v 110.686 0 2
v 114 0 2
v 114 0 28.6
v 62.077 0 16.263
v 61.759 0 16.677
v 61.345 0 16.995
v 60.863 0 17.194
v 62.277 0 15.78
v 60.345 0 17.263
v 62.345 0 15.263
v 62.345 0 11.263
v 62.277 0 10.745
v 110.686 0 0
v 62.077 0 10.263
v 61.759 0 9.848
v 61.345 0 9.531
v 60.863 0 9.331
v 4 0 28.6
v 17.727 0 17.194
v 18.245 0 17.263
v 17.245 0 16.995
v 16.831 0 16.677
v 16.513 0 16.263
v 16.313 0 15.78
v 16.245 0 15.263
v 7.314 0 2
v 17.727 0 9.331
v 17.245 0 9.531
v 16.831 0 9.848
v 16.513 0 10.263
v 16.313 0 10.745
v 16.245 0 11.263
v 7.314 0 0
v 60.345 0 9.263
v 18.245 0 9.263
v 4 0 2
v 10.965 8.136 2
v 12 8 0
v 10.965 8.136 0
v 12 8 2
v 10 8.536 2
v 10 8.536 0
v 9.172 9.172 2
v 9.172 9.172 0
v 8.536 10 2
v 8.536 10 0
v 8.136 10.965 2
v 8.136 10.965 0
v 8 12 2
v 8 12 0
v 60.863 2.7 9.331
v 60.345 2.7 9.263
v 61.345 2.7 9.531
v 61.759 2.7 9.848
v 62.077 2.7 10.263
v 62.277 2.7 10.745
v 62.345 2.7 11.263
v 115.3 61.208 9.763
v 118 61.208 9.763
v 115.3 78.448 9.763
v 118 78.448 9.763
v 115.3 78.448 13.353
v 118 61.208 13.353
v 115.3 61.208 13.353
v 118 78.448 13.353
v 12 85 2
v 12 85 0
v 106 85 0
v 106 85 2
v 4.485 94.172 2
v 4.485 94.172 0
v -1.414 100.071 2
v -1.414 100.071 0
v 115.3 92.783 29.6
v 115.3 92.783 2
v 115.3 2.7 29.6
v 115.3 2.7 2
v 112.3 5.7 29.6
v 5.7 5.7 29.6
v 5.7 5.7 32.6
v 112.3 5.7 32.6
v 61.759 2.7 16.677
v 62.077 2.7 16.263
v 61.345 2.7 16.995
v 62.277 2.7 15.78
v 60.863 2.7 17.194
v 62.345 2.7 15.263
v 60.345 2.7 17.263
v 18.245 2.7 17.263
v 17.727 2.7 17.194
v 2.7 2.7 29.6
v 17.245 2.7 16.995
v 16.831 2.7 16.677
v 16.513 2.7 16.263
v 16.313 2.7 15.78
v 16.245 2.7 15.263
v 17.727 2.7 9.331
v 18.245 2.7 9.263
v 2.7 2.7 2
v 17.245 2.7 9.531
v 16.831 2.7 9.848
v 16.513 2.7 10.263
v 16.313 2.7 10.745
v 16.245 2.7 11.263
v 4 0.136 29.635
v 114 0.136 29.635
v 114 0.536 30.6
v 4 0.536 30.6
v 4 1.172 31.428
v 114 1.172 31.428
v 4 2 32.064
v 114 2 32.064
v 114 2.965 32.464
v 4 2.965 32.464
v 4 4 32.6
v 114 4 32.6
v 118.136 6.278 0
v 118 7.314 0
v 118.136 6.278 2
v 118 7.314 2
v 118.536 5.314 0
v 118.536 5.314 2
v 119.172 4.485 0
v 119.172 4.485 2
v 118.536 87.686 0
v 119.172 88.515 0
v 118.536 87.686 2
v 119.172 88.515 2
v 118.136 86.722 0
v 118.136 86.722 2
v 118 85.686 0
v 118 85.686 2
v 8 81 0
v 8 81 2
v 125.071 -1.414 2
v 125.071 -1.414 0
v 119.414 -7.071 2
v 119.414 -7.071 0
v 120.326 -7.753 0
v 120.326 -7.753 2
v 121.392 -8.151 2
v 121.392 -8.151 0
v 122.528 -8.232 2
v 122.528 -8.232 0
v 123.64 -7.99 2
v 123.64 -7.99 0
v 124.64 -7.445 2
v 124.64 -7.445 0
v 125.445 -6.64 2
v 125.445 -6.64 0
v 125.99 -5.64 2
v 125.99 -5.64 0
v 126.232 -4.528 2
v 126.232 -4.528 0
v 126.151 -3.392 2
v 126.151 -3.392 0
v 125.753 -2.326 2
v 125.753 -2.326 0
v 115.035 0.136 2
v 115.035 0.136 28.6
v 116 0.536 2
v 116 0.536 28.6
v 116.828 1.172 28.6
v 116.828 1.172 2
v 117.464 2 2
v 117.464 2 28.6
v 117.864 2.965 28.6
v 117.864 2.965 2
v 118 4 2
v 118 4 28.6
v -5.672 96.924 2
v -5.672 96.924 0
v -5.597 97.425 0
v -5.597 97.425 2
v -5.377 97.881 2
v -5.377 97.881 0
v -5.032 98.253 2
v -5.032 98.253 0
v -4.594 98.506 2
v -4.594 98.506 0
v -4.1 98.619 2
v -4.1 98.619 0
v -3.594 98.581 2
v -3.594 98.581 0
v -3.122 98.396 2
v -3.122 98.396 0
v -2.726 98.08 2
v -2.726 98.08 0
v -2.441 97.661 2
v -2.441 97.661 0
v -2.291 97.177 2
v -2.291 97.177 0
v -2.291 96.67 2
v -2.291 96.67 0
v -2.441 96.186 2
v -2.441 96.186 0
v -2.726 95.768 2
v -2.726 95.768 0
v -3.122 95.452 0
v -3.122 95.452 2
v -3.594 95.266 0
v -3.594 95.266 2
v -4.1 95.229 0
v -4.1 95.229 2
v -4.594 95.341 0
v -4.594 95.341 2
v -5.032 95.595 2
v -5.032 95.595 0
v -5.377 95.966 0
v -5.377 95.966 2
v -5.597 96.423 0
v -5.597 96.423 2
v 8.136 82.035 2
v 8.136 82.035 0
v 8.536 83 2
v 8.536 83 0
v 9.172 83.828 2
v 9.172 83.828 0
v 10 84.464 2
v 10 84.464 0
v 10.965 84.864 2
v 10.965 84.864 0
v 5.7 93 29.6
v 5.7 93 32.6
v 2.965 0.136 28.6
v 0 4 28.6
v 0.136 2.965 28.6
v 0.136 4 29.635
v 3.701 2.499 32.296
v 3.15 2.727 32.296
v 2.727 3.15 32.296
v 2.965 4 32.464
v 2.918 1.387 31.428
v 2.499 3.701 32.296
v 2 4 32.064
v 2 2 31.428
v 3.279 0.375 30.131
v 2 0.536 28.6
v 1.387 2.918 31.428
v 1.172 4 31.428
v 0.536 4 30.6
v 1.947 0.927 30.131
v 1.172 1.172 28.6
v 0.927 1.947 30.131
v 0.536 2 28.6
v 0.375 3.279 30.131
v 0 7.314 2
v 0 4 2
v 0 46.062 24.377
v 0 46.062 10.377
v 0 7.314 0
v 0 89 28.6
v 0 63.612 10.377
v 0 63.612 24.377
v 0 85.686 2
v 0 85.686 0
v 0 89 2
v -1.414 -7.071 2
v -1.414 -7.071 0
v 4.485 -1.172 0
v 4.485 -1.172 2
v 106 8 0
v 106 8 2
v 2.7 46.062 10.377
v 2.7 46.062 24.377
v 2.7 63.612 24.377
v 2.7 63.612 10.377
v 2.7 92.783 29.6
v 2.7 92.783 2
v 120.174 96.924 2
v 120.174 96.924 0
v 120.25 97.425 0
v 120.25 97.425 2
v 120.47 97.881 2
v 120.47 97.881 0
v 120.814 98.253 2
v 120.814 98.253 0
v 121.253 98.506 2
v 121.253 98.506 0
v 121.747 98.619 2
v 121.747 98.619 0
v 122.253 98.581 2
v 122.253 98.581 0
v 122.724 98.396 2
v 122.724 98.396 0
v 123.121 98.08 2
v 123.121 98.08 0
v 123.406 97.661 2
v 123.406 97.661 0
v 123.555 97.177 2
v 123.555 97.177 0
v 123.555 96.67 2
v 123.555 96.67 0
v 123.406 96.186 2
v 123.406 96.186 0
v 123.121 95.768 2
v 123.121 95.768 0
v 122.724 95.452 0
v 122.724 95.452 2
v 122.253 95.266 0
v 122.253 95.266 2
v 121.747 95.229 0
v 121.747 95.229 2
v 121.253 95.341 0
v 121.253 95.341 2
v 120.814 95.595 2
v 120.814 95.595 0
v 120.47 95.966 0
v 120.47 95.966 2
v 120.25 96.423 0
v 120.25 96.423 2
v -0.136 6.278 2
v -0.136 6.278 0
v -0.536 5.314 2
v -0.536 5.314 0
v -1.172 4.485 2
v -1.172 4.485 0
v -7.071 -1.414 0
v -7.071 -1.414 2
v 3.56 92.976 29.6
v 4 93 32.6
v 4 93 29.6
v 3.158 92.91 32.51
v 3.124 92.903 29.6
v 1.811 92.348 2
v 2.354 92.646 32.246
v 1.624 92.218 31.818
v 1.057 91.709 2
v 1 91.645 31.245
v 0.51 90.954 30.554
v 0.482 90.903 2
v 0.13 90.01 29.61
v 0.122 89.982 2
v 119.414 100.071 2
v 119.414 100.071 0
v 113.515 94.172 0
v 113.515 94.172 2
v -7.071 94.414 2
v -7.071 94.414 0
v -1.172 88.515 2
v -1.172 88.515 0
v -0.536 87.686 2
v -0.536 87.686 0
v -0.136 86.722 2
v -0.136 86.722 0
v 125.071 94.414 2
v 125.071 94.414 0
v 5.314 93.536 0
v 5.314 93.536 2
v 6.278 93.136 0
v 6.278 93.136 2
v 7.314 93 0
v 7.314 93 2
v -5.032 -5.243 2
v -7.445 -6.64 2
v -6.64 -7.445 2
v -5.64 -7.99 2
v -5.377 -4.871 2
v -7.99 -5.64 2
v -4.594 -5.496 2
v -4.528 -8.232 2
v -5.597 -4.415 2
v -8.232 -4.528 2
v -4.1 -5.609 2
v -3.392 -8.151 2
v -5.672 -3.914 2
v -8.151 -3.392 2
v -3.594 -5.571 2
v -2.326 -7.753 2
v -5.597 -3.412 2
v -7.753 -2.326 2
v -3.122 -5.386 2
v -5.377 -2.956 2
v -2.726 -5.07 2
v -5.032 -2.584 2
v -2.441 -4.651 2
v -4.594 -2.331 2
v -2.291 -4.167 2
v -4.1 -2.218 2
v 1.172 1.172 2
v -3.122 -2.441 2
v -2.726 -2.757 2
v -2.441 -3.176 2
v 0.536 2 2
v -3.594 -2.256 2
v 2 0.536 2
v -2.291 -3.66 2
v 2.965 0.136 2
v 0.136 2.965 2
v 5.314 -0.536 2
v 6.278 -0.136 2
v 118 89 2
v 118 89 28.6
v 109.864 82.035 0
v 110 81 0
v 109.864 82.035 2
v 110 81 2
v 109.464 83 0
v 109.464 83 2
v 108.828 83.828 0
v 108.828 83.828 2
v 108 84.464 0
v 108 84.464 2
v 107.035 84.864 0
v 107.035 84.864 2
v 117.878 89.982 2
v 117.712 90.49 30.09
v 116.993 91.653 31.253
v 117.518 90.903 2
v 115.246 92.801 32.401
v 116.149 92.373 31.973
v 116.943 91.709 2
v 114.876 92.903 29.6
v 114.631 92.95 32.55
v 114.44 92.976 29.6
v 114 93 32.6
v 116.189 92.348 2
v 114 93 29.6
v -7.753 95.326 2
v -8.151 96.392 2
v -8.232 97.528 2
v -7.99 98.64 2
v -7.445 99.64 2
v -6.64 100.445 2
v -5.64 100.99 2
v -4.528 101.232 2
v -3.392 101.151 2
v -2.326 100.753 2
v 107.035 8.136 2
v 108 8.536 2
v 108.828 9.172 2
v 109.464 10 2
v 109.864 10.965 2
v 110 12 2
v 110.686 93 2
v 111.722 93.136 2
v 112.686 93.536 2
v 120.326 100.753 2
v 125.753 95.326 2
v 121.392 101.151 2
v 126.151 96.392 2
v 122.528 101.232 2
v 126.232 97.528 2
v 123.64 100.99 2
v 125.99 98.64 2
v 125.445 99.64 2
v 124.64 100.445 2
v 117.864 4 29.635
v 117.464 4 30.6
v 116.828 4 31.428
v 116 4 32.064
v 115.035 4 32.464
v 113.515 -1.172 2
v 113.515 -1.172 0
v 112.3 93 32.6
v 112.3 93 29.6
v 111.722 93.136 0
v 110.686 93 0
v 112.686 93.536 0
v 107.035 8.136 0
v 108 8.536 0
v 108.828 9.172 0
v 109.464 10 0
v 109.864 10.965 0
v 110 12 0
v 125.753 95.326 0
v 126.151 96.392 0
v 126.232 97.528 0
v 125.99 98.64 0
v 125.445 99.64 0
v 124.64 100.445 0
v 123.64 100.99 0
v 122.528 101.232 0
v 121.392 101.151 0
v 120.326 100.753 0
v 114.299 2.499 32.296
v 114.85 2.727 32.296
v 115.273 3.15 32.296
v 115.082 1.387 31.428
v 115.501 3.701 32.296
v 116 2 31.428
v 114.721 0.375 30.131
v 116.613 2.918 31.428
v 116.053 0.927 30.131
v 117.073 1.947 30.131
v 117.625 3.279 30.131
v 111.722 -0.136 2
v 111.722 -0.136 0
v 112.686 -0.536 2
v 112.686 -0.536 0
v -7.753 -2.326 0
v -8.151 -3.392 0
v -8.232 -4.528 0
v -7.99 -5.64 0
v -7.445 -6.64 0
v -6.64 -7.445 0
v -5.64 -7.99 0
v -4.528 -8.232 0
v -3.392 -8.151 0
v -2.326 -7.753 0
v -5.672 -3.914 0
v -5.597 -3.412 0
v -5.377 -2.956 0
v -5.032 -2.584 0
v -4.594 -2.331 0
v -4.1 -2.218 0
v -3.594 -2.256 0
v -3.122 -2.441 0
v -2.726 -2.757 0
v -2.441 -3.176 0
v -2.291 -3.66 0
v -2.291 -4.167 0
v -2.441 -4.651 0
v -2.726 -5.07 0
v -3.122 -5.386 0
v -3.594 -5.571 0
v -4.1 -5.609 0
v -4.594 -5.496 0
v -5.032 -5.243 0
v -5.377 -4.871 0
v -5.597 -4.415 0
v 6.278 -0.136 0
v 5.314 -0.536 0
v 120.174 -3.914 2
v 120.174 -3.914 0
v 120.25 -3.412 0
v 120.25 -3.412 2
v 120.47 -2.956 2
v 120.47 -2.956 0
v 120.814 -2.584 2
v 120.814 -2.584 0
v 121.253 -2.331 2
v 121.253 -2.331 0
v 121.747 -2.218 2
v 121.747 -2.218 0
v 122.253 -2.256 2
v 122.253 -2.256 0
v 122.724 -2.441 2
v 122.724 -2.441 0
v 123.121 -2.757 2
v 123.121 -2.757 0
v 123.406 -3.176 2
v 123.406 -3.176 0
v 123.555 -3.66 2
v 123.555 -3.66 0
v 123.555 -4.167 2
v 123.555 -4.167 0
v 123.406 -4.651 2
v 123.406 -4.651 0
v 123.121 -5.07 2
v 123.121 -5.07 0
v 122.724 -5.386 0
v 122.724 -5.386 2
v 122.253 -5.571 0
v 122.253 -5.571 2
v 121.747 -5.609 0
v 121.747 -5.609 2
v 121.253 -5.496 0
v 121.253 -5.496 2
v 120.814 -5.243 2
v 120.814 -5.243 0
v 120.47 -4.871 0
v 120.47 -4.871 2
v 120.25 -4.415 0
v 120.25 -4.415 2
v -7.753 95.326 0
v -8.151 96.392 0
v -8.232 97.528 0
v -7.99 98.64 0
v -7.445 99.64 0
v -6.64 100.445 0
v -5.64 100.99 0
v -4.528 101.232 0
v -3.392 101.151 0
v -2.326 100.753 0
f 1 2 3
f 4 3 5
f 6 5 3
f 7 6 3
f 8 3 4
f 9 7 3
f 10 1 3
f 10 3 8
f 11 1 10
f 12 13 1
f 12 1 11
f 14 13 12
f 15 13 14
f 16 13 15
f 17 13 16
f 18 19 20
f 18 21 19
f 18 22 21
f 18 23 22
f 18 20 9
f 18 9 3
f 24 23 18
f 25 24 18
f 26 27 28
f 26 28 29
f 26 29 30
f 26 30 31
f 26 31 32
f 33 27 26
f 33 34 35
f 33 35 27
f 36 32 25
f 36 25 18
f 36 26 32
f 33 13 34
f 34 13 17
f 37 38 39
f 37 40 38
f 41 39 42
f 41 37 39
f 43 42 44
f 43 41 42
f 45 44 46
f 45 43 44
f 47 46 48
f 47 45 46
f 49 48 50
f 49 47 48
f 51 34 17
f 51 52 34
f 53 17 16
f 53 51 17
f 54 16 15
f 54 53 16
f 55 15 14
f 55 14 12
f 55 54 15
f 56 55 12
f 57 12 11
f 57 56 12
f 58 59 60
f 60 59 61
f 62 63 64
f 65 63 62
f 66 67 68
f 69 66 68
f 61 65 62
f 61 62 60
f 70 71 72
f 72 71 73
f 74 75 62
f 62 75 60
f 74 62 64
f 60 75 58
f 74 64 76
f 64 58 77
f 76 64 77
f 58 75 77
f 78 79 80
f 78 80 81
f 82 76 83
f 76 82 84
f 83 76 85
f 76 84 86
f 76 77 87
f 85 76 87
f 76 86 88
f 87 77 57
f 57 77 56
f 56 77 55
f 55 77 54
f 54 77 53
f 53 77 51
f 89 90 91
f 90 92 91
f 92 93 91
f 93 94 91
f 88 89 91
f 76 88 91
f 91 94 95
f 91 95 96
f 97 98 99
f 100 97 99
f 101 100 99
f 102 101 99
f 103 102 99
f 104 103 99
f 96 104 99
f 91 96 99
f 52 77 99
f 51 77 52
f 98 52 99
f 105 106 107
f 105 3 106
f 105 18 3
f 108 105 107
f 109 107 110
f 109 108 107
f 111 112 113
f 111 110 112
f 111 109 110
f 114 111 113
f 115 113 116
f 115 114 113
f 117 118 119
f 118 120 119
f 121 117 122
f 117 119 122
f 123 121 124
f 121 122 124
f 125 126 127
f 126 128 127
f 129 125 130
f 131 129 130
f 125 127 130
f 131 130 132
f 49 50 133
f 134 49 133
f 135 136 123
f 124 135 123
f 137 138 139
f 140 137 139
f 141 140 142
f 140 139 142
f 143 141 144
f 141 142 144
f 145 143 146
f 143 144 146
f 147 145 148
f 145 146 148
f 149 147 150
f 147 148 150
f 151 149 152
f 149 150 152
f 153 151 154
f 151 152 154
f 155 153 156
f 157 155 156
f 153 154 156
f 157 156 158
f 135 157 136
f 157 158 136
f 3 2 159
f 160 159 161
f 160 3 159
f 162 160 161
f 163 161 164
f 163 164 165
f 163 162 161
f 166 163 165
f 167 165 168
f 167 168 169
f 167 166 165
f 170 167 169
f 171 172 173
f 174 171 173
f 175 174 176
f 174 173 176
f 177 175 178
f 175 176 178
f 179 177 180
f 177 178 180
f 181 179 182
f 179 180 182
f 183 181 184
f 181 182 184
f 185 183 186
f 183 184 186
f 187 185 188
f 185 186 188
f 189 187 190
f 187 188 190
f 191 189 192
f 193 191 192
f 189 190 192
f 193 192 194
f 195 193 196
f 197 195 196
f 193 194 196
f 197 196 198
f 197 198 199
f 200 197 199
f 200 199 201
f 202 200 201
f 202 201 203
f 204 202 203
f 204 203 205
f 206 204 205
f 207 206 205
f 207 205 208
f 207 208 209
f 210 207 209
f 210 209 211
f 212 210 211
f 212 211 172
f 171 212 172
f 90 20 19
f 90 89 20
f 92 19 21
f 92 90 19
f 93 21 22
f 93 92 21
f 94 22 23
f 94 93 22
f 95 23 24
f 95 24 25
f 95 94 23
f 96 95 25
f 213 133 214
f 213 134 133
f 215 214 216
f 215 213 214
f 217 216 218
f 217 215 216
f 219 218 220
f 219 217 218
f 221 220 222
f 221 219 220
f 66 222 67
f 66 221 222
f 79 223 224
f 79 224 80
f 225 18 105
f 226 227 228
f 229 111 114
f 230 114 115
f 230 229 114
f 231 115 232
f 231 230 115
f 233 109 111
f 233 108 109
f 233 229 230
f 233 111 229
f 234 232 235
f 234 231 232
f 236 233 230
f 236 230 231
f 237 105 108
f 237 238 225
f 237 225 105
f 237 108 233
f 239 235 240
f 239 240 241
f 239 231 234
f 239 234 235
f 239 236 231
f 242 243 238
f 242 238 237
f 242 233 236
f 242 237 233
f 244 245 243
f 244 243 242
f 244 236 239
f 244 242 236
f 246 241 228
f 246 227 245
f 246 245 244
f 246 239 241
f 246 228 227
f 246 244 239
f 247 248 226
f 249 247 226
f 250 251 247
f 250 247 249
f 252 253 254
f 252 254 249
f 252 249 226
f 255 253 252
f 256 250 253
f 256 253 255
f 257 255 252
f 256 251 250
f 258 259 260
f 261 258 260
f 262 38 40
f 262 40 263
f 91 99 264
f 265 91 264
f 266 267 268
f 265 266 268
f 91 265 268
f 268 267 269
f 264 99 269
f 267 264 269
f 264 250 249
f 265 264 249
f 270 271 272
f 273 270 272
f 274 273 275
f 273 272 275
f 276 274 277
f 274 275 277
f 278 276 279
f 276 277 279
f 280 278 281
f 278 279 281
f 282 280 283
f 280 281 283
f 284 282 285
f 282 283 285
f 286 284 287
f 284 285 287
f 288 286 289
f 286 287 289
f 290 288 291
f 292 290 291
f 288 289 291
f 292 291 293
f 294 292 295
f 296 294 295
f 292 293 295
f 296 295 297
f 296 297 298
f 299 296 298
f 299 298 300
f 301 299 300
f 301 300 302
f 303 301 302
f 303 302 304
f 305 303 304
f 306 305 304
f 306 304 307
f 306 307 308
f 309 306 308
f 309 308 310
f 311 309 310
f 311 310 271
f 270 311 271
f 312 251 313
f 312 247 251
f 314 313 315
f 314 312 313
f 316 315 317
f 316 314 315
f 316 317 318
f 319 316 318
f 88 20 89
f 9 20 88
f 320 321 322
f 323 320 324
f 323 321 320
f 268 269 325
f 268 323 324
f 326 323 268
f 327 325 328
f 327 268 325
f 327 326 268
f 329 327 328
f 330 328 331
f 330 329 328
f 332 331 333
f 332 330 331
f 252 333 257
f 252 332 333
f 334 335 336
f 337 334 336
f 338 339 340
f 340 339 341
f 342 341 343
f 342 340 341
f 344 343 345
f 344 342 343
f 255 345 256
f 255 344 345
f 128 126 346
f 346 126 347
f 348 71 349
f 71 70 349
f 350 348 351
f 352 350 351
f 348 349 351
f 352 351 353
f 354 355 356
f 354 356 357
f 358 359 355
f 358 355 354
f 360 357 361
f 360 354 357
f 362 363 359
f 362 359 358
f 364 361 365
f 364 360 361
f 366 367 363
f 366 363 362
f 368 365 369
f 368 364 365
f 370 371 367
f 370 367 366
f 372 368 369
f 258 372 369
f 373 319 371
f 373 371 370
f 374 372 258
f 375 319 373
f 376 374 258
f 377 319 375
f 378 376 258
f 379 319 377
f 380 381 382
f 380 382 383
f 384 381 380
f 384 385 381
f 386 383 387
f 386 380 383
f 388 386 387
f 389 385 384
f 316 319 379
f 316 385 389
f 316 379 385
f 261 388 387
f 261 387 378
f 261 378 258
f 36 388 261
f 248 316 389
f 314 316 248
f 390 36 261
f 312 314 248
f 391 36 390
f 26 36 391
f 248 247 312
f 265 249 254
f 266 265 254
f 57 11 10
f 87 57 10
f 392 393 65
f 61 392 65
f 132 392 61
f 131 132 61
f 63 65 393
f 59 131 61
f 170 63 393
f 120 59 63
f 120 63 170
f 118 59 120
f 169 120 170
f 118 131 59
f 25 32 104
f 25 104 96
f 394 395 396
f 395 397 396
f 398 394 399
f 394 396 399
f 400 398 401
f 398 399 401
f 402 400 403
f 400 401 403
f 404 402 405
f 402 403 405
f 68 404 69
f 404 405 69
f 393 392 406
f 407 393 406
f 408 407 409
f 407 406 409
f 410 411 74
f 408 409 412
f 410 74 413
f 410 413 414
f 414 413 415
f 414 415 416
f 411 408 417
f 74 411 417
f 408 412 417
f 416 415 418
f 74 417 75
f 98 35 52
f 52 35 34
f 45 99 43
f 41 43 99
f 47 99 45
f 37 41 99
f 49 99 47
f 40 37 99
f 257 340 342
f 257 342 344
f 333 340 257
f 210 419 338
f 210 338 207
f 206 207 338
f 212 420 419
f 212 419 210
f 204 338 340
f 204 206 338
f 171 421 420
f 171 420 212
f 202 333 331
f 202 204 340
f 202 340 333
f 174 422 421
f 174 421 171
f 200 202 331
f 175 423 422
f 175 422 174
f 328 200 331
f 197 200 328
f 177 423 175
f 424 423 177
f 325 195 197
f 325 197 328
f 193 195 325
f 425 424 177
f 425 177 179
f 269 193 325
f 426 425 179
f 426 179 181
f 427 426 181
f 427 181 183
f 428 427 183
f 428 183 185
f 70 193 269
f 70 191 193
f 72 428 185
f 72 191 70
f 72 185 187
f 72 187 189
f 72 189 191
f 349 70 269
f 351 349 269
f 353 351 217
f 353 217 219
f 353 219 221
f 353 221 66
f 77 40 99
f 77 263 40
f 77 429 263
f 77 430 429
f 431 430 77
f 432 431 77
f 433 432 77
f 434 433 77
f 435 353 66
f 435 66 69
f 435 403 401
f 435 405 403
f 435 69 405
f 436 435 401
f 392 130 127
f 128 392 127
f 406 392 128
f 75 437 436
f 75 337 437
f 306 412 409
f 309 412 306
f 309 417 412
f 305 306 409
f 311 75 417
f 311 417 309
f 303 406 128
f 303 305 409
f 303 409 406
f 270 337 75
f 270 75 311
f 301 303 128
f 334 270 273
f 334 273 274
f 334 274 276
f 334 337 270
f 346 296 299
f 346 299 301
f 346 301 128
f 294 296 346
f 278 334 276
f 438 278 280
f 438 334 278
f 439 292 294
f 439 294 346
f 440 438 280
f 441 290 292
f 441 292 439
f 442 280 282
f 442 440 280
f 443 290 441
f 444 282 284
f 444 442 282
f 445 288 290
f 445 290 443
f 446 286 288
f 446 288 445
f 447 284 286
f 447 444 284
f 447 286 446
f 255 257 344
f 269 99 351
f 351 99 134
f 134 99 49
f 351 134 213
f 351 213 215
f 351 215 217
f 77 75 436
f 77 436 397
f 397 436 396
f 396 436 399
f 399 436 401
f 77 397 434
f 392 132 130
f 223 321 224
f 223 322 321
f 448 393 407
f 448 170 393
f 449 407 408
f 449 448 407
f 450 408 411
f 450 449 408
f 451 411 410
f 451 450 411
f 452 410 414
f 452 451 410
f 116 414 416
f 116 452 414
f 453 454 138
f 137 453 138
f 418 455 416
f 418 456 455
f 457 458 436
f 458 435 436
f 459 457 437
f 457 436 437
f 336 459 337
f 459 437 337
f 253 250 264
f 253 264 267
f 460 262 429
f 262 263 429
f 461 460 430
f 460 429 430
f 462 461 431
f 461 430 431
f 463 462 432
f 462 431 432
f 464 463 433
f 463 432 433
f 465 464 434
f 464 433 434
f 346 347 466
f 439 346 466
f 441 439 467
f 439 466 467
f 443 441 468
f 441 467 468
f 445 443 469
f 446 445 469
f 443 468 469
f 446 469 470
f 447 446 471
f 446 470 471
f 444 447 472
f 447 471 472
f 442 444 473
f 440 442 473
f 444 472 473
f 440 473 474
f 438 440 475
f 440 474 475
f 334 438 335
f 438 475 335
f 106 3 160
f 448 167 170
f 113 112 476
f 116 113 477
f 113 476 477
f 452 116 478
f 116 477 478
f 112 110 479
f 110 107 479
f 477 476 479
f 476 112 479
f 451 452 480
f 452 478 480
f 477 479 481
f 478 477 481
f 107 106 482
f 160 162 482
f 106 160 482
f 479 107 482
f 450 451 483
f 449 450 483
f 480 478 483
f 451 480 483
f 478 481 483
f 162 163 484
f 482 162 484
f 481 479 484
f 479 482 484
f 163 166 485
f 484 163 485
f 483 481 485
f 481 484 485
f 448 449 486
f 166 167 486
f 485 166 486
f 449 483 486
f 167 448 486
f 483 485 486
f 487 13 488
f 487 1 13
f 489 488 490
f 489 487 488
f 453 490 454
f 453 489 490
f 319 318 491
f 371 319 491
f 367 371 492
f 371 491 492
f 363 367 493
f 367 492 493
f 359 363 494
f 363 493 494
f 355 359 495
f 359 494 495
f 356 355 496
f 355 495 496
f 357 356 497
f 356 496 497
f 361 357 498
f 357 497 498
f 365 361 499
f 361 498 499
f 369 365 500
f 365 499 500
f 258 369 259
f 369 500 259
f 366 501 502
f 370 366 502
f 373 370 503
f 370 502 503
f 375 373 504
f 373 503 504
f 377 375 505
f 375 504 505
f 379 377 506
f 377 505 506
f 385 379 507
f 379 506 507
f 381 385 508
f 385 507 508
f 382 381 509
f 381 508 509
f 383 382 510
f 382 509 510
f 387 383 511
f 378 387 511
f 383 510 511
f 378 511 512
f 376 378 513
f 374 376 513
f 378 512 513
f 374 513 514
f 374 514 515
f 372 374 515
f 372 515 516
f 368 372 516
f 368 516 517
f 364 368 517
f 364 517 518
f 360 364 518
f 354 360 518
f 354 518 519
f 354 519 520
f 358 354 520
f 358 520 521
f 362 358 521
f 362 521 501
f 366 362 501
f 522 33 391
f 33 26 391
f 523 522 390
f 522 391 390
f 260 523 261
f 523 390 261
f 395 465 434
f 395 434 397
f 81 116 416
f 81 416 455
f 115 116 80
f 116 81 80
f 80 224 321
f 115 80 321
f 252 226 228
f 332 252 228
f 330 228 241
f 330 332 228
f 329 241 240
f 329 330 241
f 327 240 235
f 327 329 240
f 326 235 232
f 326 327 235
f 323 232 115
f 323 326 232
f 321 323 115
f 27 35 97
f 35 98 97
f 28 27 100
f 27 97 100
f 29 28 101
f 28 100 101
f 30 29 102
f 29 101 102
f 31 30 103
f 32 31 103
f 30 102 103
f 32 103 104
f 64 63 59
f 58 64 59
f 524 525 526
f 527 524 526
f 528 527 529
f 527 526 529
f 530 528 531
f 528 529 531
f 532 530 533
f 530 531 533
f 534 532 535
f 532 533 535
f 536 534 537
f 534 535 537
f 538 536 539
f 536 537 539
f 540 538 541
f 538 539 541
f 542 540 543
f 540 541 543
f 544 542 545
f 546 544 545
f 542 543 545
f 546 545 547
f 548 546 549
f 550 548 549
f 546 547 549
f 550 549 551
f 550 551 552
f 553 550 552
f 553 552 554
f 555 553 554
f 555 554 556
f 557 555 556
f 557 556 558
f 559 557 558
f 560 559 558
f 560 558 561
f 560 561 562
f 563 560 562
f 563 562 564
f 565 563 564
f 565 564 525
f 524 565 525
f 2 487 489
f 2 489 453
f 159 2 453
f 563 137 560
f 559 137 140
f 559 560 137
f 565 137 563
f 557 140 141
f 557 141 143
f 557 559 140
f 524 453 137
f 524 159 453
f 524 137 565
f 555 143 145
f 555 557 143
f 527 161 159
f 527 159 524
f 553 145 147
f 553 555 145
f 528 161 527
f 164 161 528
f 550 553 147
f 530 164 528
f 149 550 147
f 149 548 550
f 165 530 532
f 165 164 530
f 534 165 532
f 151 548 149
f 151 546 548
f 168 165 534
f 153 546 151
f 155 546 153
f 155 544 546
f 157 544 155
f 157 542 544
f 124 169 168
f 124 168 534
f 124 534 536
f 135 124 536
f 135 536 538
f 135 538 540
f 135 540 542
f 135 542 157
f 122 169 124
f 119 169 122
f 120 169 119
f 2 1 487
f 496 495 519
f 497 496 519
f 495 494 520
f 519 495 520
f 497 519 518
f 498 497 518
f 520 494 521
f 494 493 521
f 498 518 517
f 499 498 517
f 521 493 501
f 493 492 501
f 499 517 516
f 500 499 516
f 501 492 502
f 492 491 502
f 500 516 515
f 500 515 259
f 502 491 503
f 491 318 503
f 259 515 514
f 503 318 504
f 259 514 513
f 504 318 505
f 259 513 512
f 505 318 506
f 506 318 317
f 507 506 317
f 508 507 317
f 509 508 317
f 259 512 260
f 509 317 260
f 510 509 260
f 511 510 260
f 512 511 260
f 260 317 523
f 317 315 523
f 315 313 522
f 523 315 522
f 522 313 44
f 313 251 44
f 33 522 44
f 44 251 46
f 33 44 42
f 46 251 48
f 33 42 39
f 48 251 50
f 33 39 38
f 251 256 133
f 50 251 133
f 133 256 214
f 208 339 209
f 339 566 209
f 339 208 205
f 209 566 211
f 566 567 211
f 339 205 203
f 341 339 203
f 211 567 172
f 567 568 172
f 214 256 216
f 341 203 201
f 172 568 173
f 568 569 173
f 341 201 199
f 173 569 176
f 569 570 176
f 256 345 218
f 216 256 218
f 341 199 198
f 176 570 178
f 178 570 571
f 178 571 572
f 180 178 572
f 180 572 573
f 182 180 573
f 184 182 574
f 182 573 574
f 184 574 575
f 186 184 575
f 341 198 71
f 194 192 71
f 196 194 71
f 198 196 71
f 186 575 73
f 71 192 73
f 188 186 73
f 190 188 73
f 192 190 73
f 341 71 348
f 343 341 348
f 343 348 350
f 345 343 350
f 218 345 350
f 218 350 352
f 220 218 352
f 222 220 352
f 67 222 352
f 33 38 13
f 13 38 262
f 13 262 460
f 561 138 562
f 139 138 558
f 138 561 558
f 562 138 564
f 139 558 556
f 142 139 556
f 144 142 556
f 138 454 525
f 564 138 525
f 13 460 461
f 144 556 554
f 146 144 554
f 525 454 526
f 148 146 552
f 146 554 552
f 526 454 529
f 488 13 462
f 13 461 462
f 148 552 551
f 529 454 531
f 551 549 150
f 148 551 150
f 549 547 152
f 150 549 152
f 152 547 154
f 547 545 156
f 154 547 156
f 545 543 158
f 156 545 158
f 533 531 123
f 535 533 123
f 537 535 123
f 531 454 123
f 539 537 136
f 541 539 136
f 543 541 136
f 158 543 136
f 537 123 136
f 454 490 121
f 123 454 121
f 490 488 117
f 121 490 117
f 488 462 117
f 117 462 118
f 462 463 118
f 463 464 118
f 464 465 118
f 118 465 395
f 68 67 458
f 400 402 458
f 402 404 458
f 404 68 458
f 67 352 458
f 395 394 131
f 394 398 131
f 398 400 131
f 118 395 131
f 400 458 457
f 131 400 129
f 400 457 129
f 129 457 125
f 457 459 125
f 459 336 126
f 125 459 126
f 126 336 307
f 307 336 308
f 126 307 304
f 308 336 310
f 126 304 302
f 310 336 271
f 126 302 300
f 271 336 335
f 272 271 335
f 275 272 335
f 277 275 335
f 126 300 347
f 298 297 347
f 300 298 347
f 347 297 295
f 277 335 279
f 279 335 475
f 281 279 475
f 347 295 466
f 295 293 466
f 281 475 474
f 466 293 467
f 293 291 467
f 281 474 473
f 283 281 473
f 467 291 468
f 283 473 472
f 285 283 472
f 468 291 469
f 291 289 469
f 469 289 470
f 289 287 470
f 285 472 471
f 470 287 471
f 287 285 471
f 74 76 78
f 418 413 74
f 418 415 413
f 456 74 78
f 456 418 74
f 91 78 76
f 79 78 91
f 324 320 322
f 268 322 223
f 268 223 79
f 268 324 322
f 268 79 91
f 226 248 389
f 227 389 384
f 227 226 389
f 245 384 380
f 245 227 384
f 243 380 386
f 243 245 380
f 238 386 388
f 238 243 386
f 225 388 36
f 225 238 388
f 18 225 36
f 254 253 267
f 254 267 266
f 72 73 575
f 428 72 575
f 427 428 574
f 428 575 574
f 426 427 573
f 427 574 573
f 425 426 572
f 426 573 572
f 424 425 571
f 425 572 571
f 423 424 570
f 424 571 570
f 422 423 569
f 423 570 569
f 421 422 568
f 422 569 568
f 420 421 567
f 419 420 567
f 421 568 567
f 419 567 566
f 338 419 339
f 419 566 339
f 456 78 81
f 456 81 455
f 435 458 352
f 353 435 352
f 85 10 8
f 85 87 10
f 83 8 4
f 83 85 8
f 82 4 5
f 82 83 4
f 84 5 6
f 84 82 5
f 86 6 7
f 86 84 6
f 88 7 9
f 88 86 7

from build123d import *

# Parameters (mm, degrees)
SKETCH1_W            = 102
SKETCH1_H            = 77
BOSS_EXTRUDE1_DEPTH  = 2
BOSS_EXTRUDE2_DEPTH  = 27.6
FILLET1_R            = 4
FILLET3_R            = 4
M3_CLEARANCE_HOLE1_D = 3.4
BOSS_EXTRUDE3_DEPTH  = 3
FILLET4_R            = 4
SKETCH6_W            = 14
SKETCH6_H            = 17.55
CUT_EXTRUDE1_DEPTH   = 5
SKETCH8_W            = 46.1
SKETCH8_H            = 8
CUT_EXTRUDE3_DEPTH   = 5
SKETCH9_W            = 3.59
SKETCH9_H            = 17.24
CUT_EXTRUDE4_DEPTH   = 5
FILLET5_R            = 2


with BuildPart() as part:
    # Sketch1 → Boss-Extrude1 (new body)
    with BuildSketch(Plane.XY):
        with BuildLine():
            Line((5.656854249, 0), (112.343145751, 0))
            Line((112.343145751, 0), (119.414213562, -7.071067812))
            ThreePointArc((119.414213562, -7.071067812), (125.071067812, -7.071067812), (125.071067812, -1.414213562))
            Line((125.071067812, -1.414213562), (118, 5.656854249))
            Line((118, 5.656854249), (118, 87.343145751))
            Line((118, 87.343145751), (125.071067812, 94.414213562))
            ThreePointArc((125.071067812, 94.414213562), (125.071067812, 100.071067812), (119.414213562, 100.071067812))
            Line((119.414213562, 100.071067812), (112.343145751, 93))
            Line((112.343145751, 93), (5.656854249, 93))
            Line((5.656854249, 93), (-1.414213562, 100.071067812))
            ThreePointArc((-1.414213562, 100.071067812), (-7.071067812, 100.071067812), (-7.071067812, 94.414213562))
            Line((-7.071067812, 94.414213562), (0, 87.343145751))
            Line((0, 87.343145751), (0, 5.656854249))
            Line((0, 5.656854249), (-7.071067812, -1.414213562))
            ThreePointArc((-7.071067812, -1.414213562), (-7.071067812, -7.071067812), (-1.414213562, -7.071067812))
            Line((-1.414213562, -7.071067812), (5.656854249, 0))
        make_face()
        with Locations((59, 46.5)):
            Rectangle(SKETCH1_W, SKETCH1_H, mode=Mode.SUBTRACT)
    extrude(amount=BOSS_EXTRUDE1_DEPTH)

    # Sketch2 → Boss-Extrude2 (add)
    with BuildSketch(Plane.XY.offset(2)):
        Polygon((0, 93), (0, 0), (118, 0), (118, 93), (115.3, 93), (115.3, 2.7), (2.7, 2.7), (2.7, 93), align=None)
    extrude(amount=BOSS_EXTRUDE2_DEPTH)

    # Fillet1
    fillet1_edges = [part.edges().sort_by_distance(p)[0] for p in [
        (8, 85, 1),
        (8, 8, 1),
        (110, 8, 1),
        (110, 85, 1),
    ]]
    fillet(fillet1_edges, radius=FILLET1_R)

    # Fillet3
    fillet3_edges = [part.edges().sort_by_distance(p)[0] for p in [
        (112.343145751, 0, 1),
        (5.656854249, 0, 1),
        (0, 5.656854249, 1),
        (0, 87.343145751, 1),
        (5.656854249, 93, 1),
        (112.343145751, 93, 1),
        (118, 87.343145751, 1),
        (118, 5.656854249, 1),
    ]]
    fillet(fillet3_edges, radius=FILLET3_R)

    # M3 Clearance Hole1 (through all)
    with Locations(Plane.XY.offset(2)):
        with Locations((-3.972495555, 96.92383124), (121.87433229, 96.92383124), (121.87433229, -3.91357469), (-3.972495555, -3.91357469)):
            Hole(M3_CLEARANCE_HOLE1_D / 2)

    # Sketch5 → Boss-Extrude3 (add)
    with BuildSketch(Plane.XY.offset(29.6)):
        Polygon((0, 93), (5.7, 93), (5.7, 5.7), (112.3, 5.7), (112.3, 93), (118, 93), (118, 0), (0, 0), align=None)
    extrude(amount=BOSS_EXTRUDE3_DEPTH)

    # Fillet4
    fillet4_edges = [part.edges().sort_by_distance(p)[0] for p in [
        (0, 0, 17.3),
        (118, 0, 17.3),
        (118, 93, 17.3),
        (0, 93, 17.3),
        (59, 0, 32.6),
        (118, 46.5, 32.6),
        (0, 46.5, 32.6),
    ]]
    fillet(fillet4_edges, radius=FILLET4_R)

    # Sketch6 → Cut-Extrude1 (cut)
    with BuildSketch(Plane.ZY):
        with Locations((17.37699989, 54.836937287)):
            Rectangle(SKETCH6_W, SKETCH6_H)
    extrude(amount=-CUT_EXTRUDE1_DEPTH, mode=Mode.SUBTRACT)

    # Sketch8 → Cut-Extrude3 (cut)
    with BuildSketch(Plane.XZ):
        with Locations((39.295, 13.26259989)):
            Rectangle(SKETCH8_W, SKETCH8_H)
    extrude(amount=-CUT_EXTRUDE3_DEPTH, mode=Mode.SUBTRACT)

    # Sketch9 → Cut-Extrude4 (cut)
    with BuildSketch(Plane(origin=(118, 0, 0), x_dir=(0, 0, -1), z_dir=(1, 0, 0))):
        with Locations((-11.55759989, 69.828337287)):
            Rectangle(SKETCH9_W, SKETCH9_H)
    extrude(amount=-CUT_EXTRUDE4_DEPTH, mode=Mode.SUBTRACT)

    # Fillet5
    fillet5_edges = [part.edges().sort_by_distance(p)[0] for p in [
        (16.245, 1.35, 9.26259989),
        (16.245, 1.35, 17.26259989),
        (62.345, 1.35, 17.26259989),
        (62.345, 1.35, 9.26259989),
    ]]
    fillet(fillet5_edges, radius=FILLET5_R)


solid = part.part
